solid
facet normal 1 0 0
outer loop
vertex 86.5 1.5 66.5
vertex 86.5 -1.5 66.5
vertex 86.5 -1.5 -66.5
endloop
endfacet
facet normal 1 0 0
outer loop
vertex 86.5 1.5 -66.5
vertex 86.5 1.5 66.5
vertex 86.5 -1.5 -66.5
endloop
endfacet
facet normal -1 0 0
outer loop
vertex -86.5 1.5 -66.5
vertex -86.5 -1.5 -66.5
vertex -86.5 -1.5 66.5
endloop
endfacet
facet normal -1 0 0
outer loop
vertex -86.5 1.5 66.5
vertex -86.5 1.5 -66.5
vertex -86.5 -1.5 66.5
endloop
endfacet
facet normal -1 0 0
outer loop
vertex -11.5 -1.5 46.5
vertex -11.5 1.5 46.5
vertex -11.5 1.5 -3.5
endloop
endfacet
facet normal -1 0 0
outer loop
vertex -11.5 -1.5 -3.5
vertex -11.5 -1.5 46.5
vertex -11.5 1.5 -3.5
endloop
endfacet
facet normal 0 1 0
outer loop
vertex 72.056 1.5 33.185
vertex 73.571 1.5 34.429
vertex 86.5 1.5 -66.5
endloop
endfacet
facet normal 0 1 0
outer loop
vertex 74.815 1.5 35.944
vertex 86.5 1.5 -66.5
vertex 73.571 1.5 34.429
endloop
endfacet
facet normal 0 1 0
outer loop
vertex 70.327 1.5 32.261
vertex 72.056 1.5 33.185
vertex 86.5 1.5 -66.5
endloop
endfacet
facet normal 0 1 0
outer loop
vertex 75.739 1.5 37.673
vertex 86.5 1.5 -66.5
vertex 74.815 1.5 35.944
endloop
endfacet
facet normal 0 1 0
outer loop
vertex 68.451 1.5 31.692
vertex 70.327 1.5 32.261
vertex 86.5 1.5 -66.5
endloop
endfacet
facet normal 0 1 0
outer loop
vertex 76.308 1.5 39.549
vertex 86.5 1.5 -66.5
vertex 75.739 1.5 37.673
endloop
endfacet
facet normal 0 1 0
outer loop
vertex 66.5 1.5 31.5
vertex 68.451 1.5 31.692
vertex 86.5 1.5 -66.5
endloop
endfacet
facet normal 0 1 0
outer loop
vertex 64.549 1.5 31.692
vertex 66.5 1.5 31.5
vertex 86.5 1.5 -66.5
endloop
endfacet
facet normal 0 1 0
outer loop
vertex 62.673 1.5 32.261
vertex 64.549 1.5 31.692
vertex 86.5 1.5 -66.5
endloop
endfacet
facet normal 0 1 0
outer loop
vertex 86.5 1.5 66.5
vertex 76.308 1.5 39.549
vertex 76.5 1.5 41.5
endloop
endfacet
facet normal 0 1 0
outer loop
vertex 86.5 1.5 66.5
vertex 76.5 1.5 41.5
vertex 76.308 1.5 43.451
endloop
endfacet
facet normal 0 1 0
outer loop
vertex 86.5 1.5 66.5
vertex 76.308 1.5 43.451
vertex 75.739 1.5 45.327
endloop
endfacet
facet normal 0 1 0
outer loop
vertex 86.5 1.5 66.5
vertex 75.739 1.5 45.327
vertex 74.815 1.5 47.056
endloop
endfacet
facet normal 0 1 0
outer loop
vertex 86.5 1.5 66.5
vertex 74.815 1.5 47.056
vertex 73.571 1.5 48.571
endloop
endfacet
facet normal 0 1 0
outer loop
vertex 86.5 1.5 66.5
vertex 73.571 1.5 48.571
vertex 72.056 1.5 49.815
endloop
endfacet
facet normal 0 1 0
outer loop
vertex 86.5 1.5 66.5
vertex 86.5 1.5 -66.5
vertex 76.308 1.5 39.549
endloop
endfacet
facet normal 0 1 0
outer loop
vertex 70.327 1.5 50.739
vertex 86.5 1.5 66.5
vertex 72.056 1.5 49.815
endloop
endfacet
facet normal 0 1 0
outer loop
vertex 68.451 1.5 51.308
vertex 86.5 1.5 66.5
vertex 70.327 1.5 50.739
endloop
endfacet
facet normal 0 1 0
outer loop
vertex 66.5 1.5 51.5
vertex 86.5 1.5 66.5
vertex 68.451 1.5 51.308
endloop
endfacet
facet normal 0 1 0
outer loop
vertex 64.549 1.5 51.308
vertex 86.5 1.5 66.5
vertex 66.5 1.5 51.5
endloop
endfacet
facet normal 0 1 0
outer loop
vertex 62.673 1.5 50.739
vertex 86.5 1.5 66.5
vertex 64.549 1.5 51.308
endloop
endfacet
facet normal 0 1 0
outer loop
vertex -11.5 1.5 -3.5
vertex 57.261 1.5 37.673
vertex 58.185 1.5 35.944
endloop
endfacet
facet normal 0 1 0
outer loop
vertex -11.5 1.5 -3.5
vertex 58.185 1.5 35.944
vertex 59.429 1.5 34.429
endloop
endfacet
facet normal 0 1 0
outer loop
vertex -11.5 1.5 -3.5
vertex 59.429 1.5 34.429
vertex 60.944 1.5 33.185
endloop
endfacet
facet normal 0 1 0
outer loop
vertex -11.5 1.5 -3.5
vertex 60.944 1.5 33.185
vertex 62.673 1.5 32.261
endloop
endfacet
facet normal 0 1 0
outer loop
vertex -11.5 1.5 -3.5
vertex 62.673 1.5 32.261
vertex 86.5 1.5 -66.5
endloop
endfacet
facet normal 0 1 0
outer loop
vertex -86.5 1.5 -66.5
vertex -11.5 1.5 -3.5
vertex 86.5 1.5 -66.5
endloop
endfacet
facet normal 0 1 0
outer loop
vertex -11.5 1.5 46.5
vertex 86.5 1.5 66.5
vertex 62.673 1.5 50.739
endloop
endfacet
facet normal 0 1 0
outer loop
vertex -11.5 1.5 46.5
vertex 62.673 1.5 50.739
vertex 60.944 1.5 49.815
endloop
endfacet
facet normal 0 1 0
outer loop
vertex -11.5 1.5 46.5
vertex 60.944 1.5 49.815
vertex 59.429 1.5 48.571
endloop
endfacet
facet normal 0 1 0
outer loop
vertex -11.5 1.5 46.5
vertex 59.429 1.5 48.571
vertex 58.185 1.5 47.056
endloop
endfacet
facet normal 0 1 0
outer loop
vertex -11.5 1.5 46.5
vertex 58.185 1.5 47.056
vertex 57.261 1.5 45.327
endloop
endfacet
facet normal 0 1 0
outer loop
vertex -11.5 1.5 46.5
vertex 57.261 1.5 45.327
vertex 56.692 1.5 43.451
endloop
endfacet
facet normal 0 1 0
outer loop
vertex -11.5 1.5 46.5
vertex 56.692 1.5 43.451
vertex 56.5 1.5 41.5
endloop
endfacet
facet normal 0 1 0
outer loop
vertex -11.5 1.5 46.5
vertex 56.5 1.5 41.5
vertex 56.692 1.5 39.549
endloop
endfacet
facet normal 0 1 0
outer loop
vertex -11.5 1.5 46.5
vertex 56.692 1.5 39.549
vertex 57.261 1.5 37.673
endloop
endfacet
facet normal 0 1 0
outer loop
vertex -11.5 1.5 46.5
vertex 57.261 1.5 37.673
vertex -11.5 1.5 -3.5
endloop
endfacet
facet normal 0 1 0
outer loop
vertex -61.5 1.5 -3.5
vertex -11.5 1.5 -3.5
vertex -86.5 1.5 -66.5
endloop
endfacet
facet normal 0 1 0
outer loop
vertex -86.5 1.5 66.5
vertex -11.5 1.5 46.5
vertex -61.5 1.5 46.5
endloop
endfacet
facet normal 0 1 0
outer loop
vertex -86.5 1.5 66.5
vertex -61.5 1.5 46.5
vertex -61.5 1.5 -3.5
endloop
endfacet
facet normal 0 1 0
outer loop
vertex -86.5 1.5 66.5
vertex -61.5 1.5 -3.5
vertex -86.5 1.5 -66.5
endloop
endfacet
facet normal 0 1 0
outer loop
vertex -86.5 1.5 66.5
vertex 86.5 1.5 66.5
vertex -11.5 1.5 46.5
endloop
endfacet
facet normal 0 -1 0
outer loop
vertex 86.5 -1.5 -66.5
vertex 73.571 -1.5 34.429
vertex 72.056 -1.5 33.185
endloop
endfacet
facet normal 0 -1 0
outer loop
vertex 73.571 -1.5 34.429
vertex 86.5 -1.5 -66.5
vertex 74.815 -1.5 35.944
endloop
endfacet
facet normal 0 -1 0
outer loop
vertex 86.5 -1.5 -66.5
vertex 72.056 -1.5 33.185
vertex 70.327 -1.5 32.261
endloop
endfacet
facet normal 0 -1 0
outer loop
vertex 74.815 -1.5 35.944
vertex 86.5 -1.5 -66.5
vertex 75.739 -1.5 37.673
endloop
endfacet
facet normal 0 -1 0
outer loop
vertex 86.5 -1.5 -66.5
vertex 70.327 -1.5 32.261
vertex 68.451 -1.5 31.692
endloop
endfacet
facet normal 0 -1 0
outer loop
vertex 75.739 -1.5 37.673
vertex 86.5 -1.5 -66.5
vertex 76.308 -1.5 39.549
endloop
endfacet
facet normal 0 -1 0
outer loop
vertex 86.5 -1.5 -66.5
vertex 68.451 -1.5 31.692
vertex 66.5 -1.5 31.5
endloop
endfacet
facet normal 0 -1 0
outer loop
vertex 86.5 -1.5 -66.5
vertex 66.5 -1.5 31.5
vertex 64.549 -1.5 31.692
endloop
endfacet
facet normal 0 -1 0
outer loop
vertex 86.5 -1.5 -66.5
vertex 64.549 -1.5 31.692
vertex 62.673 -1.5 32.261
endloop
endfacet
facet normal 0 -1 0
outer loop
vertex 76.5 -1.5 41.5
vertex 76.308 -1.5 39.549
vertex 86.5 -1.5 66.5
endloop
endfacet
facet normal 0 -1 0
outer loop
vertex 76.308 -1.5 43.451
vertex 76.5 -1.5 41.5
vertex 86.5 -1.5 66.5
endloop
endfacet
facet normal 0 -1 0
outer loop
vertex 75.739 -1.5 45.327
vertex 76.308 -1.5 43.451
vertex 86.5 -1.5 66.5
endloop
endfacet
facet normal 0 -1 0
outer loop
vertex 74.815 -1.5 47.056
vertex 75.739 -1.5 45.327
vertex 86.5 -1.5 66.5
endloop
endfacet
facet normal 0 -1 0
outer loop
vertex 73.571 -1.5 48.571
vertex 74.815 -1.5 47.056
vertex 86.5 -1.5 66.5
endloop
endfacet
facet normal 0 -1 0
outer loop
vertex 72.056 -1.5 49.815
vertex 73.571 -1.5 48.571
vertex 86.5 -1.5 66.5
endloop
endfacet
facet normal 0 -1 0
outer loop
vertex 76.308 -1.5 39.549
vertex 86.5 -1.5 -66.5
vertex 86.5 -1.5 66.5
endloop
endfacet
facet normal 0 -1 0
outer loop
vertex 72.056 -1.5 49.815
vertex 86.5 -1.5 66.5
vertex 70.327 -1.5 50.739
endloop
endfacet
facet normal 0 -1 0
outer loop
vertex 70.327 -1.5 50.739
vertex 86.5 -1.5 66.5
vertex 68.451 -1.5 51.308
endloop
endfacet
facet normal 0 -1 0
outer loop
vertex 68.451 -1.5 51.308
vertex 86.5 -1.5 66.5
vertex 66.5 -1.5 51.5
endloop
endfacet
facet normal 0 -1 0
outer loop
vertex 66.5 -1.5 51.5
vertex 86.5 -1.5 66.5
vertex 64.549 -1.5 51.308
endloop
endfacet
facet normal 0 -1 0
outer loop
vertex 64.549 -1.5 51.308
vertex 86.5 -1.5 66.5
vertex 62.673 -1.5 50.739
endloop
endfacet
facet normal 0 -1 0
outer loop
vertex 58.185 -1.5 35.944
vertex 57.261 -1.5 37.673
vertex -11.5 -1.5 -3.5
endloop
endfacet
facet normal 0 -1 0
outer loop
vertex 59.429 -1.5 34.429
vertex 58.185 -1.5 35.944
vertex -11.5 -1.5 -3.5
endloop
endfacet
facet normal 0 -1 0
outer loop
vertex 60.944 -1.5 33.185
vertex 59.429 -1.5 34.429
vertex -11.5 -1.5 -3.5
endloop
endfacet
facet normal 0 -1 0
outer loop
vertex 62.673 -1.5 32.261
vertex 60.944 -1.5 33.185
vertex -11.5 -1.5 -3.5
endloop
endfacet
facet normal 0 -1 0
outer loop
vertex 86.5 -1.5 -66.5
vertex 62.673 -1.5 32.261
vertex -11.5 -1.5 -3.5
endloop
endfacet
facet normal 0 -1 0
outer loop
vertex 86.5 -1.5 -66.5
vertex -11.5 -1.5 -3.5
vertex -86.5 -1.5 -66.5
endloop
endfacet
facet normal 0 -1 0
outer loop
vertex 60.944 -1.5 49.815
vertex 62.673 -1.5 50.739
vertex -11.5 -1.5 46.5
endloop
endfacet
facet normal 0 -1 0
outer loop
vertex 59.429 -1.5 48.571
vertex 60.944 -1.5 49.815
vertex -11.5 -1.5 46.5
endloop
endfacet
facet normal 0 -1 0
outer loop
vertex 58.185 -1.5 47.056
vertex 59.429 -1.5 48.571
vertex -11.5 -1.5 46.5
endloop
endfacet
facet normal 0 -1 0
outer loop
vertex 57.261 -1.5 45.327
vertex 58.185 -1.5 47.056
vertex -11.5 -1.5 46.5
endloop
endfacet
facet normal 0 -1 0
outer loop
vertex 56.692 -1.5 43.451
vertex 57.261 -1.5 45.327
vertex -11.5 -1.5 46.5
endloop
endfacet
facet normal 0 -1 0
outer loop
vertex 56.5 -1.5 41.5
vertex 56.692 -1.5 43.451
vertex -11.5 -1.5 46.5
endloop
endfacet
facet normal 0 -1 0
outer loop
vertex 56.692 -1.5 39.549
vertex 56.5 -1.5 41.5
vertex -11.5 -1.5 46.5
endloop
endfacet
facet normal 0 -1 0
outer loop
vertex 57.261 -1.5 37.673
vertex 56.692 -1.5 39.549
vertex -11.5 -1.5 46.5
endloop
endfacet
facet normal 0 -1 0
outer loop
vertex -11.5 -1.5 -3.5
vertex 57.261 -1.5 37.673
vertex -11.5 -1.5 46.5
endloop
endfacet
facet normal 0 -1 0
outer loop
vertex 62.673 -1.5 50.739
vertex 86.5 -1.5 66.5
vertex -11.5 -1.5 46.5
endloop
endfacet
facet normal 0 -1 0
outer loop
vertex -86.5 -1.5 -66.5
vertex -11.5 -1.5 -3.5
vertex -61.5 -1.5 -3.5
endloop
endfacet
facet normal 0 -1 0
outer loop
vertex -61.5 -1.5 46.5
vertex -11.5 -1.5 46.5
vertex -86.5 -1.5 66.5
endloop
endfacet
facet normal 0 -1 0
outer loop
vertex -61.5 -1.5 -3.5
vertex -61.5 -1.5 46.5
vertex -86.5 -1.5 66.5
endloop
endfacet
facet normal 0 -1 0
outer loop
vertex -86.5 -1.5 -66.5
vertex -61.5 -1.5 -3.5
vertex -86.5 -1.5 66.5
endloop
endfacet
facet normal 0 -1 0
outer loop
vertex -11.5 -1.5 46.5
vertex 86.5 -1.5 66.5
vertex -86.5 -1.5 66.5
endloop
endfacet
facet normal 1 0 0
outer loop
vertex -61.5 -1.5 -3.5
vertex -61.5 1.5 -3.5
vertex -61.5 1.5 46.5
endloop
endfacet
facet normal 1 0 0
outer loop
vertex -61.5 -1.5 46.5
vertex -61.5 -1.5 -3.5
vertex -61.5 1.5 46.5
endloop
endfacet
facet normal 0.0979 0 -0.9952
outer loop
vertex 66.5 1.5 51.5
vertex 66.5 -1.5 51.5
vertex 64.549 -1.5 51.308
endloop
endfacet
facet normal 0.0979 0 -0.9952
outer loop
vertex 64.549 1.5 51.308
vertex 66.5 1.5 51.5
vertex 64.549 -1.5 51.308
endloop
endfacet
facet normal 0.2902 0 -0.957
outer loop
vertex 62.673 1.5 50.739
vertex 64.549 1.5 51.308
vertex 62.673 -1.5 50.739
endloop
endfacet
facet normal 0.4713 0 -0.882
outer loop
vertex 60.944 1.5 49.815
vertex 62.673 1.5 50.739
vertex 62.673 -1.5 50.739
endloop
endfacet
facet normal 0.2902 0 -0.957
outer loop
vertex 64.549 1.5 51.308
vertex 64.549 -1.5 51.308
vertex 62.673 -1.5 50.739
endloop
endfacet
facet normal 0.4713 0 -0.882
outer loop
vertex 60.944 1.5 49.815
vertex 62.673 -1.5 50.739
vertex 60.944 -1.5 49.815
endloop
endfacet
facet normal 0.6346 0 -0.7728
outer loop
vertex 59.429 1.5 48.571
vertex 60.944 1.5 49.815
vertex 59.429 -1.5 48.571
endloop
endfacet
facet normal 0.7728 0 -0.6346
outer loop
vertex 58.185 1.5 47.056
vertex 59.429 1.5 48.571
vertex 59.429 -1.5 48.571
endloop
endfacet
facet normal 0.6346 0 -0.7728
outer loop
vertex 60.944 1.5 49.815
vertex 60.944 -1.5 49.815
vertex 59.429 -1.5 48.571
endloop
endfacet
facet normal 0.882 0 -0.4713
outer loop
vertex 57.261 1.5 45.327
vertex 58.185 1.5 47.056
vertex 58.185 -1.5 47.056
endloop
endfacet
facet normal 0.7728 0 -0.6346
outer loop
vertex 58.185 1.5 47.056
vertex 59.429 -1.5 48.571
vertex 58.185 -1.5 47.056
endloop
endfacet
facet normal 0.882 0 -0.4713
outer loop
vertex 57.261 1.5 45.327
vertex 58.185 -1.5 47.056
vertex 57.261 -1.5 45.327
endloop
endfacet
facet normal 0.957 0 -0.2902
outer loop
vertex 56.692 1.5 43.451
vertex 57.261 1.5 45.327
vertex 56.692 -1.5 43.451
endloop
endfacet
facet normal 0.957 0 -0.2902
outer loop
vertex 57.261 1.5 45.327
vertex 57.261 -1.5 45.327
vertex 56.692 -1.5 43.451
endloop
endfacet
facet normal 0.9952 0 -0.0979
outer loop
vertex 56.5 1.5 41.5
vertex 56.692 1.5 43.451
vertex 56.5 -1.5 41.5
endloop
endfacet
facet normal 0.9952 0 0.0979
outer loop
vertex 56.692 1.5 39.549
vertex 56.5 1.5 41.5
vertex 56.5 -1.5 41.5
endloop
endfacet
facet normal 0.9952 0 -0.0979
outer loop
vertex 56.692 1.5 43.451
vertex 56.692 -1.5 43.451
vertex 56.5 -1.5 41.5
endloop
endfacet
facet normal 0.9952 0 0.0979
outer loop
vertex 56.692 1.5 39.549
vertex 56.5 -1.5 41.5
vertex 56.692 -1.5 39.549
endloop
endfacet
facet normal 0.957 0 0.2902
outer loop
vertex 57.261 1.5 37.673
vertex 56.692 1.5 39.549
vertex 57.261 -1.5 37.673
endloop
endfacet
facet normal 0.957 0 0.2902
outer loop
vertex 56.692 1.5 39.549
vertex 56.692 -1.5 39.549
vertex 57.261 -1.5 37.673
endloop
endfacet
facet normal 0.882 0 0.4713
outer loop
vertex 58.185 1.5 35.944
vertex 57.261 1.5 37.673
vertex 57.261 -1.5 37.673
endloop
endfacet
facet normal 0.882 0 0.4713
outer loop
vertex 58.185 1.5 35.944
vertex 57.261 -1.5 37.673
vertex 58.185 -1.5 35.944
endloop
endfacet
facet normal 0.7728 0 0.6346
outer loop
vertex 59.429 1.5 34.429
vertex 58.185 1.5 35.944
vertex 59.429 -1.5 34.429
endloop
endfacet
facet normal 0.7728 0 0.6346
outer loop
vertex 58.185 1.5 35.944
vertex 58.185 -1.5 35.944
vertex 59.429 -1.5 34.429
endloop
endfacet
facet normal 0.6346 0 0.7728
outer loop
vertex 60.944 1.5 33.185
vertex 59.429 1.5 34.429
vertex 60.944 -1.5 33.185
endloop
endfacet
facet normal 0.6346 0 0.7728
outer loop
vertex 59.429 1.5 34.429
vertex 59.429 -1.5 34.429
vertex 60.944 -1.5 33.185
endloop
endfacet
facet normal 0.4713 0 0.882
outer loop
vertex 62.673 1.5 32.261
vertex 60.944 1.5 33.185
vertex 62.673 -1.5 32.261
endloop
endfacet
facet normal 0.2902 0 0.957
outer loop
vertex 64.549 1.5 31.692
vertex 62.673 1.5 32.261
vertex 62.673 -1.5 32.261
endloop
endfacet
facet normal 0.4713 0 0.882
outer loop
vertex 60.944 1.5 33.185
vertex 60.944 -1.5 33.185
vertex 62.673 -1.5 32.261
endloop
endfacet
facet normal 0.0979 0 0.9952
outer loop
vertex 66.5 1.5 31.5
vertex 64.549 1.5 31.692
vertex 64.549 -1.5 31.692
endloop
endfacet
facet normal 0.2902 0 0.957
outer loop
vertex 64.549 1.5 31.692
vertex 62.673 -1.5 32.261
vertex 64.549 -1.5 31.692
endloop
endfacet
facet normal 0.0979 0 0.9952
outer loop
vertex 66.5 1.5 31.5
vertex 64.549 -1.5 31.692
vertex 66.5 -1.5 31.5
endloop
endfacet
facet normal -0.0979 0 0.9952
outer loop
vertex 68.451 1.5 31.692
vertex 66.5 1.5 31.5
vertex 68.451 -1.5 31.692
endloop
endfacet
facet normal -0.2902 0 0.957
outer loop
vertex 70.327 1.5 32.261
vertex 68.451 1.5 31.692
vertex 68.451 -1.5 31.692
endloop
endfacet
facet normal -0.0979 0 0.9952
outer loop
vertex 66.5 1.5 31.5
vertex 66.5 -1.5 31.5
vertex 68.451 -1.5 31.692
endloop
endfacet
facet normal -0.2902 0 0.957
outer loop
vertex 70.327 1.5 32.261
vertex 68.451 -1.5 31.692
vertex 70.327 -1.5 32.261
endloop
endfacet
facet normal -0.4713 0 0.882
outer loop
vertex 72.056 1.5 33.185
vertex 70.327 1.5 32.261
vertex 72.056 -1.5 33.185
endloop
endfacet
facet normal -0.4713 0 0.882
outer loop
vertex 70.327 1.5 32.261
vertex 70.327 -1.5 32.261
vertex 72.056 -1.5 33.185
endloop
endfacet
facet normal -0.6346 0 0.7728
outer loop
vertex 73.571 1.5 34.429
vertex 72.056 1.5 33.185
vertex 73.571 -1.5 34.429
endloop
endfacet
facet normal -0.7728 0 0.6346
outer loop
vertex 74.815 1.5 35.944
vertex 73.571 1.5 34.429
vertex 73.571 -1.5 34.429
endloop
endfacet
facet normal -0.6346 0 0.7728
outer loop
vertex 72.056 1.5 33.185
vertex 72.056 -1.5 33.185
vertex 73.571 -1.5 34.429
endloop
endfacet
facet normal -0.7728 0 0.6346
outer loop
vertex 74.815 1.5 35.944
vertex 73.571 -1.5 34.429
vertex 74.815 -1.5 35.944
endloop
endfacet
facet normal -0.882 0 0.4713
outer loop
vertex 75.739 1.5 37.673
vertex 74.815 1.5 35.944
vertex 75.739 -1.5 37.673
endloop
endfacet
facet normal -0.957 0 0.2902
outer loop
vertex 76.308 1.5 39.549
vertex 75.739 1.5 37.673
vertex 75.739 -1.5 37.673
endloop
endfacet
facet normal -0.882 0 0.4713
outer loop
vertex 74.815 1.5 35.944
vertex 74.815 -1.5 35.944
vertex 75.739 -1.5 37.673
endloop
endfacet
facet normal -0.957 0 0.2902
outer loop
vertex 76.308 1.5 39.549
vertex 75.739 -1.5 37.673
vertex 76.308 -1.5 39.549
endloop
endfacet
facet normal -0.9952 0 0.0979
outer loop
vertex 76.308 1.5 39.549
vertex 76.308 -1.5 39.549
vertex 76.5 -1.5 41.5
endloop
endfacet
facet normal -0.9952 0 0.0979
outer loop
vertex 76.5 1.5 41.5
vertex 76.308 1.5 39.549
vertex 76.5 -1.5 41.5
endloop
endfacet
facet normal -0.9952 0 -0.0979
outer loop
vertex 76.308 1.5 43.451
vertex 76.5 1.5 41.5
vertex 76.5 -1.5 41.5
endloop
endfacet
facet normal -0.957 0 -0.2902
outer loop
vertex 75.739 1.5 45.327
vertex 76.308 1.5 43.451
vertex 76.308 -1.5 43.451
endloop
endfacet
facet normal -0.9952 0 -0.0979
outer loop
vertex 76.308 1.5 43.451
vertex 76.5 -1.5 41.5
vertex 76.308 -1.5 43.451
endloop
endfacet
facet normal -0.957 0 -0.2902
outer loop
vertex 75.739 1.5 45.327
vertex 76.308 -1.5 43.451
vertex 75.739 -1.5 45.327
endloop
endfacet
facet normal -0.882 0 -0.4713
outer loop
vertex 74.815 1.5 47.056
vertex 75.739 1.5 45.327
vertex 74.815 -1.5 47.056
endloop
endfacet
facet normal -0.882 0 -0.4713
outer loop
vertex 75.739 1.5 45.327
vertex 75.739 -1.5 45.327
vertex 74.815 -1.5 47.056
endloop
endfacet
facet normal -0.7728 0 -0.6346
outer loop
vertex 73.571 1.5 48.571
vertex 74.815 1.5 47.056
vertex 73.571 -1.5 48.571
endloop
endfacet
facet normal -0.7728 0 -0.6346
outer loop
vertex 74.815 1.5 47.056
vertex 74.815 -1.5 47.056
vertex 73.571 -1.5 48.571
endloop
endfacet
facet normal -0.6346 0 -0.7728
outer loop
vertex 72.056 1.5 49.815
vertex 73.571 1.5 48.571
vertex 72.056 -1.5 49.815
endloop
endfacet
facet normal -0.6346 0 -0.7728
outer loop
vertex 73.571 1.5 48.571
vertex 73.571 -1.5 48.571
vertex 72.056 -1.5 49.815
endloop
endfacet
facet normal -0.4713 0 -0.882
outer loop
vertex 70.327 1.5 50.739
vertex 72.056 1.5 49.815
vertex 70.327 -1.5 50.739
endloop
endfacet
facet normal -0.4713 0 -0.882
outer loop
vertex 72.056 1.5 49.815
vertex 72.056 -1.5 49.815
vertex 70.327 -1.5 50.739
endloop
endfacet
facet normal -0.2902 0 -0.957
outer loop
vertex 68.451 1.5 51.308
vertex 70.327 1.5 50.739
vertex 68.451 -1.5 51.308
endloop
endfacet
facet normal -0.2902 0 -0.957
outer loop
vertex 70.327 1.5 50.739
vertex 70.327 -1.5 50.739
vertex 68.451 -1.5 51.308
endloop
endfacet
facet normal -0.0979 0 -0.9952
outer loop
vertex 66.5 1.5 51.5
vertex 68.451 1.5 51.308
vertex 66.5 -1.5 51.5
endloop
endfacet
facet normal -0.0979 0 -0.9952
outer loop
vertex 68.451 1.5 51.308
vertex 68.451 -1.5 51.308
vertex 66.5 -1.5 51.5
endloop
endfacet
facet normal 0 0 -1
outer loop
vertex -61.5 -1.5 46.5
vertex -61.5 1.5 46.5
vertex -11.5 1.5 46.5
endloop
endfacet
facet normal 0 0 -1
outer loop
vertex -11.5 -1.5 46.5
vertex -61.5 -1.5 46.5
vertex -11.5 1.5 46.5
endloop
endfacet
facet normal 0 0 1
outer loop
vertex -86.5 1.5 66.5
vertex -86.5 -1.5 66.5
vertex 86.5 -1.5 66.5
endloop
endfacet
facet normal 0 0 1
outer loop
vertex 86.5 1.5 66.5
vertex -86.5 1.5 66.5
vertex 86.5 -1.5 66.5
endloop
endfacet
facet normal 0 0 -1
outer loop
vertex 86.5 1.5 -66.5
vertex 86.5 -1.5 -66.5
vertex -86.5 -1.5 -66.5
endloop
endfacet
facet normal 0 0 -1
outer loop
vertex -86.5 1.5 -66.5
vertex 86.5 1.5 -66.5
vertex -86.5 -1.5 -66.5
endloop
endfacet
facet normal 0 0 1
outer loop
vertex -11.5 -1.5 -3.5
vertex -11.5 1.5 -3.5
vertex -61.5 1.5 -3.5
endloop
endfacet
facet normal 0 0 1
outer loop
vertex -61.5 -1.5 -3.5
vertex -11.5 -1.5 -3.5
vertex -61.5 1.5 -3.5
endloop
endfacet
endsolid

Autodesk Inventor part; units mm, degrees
ref_plane "YZ Plane" through (0, 0, 0) normal (1, 0, 0) x (0, 1, 0)
ref_plane "XZ Plane" through (0, 0, 0) normal (0, 1, 0) x (-1, 0, 0)
ref_plane "XY Plane" through (0, 0, 0) normal (0, 0, 1) x (1, 0, 0)
sketch "Náčrt1" plane through (0, 0, 0) normal (0, 1, 0) x (-1, 0, 0)
  line L0 (0, -93.1) -> (0, 93.1) projected
  line L1 (-121.1, 0) -> (121.1, 0) projected
  line L2 (86.5, 66.5) -> (-86.5, 66.5)
  line L3 (-86.5, 66.5) -> (-86.5, -66.5)
  line L4 (-86.5, -66.5) -> (86.5, -66.5)
  line L5 (86.5, -66.5) -> (86.5, 66.5)
  point P0 (0, 0)
  dimension "d0" = 133
  dimension "d1" = 173
extrude "Vysunutí1" add sketch "Náčrt1" along normal mid plane 3
sketch "Náčrt2" plane through (0, 1.5, 0) normal (0, 1, 0) x (1, 0, 0)
  line L0 (-61.5, -46.5) -> (-11.5, -46.5)
  line L1 (-11.5, -46.5) -> (-11.5, 3.5)
  line L2 (-11.5, 3.5) -> (-61.5, 3.5)
  line L3 (-61.5, 3.5) -> (-61.5, -46.5)
  line L4 (-86.5, -66.5) -> (86.5, -66.5) projected
  line L5 (-86.5, 66.5) -> (-86.5, -66.5) projected
  point P0 (0, 0)
  dimension "d4" = 50
  dimension "d5" = 50
  dimension "d12" = 25
  dimension "d13" = 20
extrude "Vysunutí3" cut sketch "Náčrt2" against normal through all
sketch "Náčrt3" plane through (0, 1.5, 0) normal (0, 1, 0) x (1, 0, 0)
  line L0 (-86.5, -66.5) -> (86.5, -66.5) projected
  line L1 (86.5, -66.5) -> (86.5, 66.5) projected
  point P0 (0, 0)
  point P1 (66.5, -41.5)
  dimension "d19" = 20
  dimension "d20" = 25
hole "Díra1" at (66.5, 1.5, 41.5) direction (0, -1, 0) diameter 20 end through all
properties part number "Cabinet - left"
